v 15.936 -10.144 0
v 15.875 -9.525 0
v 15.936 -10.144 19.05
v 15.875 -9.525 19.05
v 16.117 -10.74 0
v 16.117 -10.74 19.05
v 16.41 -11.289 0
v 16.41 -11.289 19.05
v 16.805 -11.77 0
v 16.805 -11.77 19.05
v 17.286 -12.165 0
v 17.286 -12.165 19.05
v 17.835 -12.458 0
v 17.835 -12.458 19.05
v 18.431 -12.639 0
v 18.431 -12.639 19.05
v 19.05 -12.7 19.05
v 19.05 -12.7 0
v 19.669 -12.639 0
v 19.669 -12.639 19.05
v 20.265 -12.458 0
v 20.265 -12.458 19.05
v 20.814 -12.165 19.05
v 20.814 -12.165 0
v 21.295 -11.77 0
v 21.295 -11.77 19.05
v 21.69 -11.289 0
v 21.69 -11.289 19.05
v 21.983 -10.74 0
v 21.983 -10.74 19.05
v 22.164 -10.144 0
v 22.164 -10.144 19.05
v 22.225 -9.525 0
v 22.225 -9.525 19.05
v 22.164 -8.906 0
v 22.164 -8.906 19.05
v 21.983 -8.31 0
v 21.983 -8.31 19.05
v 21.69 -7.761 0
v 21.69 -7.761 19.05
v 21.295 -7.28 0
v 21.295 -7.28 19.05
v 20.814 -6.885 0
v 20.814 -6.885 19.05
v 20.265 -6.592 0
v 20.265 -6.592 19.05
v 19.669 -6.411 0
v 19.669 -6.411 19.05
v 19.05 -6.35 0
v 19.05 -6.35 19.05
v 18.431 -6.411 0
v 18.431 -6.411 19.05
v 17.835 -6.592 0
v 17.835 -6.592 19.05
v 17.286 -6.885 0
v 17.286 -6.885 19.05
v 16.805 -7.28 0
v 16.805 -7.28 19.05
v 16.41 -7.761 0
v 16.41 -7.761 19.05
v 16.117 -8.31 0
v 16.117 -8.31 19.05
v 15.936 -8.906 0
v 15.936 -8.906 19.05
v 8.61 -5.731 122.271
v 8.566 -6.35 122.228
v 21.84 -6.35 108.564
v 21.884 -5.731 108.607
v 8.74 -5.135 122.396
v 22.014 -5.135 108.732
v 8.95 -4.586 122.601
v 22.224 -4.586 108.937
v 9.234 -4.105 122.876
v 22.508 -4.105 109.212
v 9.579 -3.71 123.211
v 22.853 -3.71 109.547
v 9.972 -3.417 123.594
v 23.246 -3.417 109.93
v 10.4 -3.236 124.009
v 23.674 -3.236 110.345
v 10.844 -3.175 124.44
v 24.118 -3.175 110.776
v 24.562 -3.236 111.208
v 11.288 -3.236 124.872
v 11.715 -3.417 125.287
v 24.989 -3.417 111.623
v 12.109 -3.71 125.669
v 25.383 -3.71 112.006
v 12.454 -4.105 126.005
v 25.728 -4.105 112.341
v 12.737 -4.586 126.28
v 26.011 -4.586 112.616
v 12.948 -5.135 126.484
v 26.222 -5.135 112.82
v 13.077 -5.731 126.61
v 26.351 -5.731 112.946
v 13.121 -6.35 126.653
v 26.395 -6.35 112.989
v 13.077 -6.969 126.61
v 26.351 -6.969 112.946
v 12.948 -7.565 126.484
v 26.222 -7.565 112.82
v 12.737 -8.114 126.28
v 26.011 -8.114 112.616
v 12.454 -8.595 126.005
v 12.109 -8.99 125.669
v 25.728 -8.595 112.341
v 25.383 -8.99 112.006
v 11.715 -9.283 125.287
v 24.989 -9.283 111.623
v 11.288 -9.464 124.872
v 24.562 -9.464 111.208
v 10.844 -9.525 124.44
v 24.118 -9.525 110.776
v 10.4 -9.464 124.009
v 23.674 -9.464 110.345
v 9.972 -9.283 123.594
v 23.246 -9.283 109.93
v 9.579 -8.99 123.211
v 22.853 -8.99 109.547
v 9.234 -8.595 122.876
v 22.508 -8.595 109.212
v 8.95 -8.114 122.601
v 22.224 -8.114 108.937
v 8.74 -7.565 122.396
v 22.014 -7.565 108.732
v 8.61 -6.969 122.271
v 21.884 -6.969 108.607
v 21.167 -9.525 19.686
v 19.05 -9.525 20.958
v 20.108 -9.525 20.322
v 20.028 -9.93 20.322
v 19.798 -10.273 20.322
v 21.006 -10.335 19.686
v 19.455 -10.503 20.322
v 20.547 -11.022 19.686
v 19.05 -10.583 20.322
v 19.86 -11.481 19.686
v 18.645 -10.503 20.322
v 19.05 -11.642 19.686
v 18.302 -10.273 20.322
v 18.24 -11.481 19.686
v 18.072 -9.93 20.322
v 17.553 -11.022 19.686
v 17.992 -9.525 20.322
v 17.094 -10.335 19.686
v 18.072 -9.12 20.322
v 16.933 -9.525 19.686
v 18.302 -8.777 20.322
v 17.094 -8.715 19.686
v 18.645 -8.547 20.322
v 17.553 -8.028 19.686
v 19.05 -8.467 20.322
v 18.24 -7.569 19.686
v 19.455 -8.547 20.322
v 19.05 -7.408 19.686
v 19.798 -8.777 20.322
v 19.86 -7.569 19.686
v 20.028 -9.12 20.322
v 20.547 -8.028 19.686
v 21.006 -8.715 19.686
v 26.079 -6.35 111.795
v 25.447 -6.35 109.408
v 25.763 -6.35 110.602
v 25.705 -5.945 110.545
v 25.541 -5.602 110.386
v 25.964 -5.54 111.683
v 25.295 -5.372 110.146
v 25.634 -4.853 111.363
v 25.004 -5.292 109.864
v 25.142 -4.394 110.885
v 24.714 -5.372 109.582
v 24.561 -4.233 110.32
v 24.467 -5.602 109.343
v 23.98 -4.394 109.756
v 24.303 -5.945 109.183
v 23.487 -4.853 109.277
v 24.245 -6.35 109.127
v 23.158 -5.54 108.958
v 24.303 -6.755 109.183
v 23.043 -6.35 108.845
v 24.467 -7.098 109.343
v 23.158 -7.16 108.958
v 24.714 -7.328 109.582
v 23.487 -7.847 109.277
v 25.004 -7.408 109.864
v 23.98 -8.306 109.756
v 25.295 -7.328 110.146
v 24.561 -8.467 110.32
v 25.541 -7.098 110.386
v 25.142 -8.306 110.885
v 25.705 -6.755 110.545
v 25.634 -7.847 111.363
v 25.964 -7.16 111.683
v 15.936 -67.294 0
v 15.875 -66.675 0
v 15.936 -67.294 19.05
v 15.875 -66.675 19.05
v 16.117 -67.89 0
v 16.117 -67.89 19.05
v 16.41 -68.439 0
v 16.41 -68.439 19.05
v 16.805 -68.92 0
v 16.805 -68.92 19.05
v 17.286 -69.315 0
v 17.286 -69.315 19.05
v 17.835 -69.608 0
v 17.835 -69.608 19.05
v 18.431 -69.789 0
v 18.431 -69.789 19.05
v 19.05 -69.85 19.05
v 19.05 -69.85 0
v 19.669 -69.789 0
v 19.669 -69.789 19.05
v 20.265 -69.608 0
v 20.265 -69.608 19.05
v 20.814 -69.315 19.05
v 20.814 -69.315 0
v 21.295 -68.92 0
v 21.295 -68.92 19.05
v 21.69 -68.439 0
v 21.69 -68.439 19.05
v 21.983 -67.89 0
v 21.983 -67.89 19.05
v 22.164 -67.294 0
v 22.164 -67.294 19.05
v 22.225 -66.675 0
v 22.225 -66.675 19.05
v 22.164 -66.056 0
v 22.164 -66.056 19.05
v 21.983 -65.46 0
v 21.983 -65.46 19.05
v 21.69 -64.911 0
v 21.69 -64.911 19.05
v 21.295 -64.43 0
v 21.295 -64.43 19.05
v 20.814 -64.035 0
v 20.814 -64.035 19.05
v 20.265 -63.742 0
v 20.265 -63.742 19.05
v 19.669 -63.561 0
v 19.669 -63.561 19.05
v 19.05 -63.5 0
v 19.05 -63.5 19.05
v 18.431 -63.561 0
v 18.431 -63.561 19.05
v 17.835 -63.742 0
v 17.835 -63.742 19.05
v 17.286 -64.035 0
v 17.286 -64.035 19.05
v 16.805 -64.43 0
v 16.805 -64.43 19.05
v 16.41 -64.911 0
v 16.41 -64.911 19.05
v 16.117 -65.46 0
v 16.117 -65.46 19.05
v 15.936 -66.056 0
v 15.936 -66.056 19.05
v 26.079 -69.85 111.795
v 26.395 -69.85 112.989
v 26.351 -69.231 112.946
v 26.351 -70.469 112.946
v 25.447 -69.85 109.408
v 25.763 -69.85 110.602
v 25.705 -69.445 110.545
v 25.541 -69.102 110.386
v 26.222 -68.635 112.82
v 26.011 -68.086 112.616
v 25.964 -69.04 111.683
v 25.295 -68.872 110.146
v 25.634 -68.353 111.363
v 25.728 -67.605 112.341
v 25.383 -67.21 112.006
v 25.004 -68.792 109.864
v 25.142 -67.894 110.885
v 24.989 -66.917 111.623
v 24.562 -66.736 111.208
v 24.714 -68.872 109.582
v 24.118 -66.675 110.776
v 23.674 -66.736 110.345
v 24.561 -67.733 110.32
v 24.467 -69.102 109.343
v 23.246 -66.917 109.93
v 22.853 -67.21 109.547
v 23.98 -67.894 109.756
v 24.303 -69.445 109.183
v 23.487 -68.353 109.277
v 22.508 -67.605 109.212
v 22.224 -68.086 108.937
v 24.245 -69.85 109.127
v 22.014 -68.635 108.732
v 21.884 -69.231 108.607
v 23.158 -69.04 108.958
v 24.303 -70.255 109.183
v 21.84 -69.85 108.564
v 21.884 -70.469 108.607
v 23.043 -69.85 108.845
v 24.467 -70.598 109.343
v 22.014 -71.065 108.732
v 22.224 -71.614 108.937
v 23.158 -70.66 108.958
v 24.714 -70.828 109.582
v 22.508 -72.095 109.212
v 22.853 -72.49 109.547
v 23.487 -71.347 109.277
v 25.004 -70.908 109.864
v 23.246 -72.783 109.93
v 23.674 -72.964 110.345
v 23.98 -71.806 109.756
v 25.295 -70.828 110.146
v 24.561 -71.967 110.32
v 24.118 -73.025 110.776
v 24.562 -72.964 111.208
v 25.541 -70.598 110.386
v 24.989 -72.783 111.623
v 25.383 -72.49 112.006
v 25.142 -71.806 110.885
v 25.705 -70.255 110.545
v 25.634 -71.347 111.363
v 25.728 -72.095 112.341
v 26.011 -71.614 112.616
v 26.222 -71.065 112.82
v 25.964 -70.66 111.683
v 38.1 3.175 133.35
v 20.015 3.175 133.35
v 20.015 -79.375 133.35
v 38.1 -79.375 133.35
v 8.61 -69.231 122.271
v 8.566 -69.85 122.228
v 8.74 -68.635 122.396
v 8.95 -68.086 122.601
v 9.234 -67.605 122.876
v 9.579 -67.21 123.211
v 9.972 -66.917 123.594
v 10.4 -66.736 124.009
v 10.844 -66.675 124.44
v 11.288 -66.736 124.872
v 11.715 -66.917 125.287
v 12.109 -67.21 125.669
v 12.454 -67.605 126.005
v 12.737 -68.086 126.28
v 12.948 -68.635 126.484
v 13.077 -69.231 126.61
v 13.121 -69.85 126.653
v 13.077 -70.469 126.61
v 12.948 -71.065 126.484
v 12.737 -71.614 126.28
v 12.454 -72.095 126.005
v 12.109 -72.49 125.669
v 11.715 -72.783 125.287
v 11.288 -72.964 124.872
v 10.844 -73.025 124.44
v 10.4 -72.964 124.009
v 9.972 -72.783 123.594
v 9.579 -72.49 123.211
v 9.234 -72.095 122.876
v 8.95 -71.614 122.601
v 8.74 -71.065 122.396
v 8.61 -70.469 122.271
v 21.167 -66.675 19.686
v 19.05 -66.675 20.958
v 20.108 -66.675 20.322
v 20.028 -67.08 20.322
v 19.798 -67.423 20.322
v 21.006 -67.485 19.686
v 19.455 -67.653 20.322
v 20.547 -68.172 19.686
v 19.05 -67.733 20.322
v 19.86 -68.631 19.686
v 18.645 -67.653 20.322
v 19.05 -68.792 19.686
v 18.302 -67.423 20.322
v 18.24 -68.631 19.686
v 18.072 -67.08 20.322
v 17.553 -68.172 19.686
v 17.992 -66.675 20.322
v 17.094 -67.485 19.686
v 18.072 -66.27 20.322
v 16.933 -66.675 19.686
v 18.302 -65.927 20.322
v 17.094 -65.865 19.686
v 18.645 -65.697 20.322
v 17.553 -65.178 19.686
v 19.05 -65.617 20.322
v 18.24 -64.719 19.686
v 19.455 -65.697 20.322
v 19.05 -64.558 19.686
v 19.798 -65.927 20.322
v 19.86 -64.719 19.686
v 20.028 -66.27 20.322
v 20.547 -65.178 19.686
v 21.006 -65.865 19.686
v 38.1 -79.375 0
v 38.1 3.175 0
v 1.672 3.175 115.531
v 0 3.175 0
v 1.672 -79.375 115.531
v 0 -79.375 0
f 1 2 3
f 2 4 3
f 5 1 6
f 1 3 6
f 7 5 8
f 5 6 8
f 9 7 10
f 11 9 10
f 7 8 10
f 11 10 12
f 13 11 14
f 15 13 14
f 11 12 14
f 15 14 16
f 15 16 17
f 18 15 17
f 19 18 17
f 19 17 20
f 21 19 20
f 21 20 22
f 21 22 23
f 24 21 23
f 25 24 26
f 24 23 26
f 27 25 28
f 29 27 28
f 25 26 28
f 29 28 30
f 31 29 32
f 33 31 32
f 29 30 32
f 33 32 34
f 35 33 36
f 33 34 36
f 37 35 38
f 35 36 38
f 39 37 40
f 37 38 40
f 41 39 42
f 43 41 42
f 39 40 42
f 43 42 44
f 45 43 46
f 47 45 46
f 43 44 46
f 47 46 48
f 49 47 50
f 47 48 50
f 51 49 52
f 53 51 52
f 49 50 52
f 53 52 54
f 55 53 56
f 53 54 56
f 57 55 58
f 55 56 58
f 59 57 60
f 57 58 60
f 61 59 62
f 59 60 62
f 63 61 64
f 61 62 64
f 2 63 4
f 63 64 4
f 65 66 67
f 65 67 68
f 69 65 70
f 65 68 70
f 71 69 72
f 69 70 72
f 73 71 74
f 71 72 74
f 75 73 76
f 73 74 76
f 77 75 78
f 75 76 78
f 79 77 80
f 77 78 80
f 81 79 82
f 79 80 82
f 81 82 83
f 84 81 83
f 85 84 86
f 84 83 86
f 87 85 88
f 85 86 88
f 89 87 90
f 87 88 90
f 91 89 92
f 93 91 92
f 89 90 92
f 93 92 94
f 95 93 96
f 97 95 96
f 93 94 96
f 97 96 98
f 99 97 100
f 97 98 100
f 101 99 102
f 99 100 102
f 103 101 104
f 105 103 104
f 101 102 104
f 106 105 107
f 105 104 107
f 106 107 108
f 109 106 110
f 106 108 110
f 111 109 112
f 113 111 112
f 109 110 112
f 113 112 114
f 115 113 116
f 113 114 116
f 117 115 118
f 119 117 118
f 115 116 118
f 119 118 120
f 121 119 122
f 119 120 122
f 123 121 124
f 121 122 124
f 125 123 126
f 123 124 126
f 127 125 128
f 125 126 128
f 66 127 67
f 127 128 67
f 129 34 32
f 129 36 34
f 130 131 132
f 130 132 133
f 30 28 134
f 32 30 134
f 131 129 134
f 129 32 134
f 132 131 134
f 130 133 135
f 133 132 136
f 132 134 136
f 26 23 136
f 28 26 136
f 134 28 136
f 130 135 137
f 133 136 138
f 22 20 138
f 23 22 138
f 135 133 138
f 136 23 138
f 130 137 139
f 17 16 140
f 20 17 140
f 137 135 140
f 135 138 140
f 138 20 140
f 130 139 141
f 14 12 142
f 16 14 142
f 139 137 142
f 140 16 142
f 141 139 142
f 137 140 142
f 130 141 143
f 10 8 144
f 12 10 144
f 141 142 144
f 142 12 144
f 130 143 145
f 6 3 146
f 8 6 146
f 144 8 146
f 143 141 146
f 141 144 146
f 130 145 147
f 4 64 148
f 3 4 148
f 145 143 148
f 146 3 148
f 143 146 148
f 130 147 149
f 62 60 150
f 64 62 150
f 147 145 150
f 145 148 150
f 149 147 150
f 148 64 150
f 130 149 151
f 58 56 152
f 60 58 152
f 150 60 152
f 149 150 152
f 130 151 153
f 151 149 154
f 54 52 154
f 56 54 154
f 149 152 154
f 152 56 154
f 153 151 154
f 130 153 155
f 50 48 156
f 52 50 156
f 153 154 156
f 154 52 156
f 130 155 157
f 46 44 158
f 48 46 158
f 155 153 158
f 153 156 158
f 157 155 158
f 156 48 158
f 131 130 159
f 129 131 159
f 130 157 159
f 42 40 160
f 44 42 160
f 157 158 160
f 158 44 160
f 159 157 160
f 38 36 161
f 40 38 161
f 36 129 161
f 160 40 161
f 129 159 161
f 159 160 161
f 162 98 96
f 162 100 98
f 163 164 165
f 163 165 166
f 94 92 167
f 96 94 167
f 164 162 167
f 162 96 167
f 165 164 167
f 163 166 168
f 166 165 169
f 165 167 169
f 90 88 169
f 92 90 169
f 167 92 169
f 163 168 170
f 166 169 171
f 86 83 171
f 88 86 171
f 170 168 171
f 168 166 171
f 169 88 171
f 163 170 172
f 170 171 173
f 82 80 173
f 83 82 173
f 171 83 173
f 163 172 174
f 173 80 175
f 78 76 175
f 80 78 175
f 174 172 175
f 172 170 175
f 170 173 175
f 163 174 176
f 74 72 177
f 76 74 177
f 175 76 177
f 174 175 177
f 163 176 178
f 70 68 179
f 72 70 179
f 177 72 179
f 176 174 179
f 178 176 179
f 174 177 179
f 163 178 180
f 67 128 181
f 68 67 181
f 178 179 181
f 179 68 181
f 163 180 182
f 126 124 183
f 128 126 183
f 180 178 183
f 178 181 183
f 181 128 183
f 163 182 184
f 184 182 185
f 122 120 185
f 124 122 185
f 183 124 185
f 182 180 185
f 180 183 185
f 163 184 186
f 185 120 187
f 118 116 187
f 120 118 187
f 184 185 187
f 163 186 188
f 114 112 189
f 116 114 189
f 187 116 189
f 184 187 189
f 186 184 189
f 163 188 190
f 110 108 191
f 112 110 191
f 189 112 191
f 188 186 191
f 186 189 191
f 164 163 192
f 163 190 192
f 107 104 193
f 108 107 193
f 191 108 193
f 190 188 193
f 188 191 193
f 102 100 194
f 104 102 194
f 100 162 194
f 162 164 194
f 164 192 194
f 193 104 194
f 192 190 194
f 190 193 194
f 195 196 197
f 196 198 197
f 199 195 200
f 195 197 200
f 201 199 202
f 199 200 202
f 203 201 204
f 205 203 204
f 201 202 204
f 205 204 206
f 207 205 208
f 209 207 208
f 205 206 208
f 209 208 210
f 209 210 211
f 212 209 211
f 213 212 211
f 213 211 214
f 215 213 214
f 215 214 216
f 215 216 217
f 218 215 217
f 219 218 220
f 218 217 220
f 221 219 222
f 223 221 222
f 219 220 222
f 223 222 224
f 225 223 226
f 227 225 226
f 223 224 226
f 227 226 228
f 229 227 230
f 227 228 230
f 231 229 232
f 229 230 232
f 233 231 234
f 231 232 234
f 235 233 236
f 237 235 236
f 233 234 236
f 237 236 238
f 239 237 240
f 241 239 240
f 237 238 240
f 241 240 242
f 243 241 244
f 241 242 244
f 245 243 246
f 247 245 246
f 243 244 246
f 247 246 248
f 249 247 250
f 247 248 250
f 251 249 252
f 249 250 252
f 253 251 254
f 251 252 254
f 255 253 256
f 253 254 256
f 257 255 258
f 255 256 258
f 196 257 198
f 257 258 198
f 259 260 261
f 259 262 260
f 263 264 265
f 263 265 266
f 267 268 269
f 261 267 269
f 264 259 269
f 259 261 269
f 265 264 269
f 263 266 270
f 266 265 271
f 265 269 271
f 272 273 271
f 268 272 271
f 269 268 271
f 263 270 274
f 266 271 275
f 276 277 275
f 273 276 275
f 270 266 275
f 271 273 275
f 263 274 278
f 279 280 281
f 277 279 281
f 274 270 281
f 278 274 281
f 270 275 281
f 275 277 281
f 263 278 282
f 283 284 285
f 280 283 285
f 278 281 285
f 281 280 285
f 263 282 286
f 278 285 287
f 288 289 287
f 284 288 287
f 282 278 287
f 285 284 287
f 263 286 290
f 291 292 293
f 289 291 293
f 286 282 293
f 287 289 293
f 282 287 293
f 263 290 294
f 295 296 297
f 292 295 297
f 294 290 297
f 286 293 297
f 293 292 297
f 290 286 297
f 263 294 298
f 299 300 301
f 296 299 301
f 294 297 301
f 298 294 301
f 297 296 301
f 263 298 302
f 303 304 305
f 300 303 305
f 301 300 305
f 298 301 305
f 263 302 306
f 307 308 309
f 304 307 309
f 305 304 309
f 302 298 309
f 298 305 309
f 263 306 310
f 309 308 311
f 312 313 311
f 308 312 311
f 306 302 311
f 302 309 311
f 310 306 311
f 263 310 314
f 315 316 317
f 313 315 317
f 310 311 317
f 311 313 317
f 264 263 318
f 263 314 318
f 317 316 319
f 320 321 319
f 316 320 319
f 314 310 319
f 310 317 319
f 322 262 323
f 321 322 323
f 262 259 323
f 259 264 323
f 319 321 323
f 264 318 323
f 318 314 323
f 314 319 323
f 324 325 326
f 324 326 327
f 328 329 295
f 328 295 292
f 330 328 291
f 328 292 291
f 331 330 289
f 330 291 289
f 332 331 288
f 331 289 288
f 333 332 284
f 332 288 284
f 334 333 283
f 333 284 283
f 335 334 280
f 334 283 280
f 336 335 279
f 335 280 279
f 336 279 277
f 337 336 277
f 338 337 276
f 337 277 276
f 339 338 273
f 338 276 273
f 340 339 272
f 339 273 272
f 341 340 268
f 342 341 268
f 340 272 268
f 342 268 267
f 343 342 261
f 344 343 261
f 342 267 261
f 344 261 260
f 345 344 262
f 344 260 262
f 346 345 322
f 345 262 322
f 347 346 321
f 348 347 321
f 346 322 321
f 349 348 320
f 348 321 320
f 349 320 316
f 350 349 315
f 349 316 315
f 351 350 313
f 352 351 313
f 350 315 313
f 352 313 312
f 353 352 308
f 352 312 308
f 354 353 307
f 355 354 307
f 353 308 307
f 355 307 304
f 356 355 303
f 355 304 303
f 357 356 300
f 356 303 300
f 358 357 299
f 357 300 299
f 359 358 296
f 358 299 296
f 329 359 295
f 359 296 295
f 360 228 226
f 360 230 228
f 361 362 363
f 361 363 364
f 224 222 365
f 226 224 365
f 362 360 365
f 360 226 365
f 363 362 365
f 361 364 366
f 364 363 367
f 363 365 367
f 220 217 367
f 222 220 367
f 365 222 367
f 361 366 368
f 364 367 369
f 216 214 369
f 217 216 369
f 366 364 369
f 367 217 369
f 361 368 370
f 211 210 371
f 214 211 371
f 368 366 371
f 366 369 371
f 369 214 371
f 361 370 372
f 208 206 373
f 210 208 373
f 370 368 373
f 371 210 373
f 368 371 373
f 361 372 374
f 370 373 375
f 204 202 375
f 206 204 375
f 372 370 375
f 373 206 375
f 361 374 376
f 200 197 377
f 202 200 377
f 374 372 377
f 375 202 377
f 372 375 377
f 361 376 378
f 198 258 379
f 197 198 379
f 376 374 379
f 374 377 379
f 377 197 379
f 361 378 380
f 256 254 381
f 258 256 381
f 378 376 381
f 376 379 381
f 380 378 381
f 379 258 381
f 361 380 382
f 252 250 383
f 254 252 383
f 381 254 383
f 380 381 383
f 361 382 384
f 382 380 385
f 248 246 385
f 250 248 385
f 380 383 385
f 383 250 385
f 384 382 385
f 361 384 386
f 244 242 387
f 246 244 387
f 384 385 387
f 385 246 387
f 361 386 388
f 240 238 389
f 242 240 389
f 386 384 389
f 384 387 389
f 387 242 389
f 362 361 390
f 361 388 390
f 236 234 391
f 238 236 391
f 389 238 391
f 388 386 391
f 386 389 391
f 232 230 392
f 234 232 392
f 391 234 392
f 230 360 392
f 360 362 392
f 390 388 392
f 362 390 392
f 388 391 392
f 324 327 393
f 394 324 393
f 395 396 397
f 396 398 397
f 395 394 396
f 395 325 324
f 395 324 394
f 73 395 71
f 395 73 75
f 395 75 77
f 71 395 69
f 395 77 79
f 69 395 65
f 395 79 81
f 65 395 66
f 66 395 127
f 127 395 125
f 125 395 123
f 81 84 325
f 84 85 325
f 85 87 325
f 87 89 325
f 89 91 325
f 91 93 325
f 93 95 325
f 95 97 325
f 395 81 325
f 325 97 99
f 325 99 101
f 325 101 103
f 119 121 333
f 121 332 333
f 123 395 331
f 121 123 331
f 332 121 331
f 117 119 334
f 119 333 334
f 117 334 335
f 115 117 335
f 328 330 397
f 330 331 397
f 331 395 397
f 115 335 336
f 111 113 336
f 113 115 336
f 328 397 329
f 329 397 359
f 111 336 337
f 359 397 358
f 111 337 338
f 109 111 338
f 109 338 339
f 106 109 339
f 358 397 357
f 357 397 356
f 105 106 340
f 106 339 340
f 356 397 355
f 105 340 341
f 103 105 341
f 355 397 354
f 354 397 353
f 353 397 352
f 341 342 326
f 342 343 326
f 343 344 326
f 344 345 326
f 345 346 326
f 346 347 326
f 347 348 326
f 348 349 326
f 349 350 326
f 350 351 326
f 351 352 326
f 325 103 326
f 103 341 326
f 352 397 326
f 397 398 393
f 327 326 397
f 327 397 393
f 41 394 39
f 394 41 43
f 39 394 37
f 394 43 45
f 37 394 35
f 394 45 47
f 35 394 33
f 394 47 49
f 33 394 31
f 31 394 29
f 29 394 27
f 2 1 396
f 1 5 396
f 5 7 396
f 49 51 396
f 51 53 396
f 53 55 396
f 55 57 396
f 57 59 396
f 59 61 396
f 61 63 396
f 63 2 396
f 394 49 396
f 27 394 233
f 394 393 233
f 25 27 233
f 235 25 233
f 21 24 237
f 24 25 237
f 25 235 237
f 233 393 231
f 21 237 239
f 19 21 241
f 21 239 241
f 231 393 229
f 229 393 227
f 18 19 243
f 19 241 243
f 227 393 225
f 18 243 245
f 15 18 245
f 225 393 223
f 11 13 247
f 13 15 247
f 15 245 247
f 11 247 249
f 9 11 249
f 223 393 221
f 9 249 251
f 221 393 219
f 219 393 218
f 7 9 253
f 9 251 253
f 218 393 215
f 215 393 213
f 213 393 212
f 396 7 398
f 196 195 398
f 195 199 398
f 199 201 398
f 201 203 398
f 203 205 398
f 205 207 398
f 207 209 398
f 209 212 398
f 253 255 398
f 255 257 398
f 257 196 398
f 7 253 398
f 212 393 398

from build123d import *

# Parameters (mm, degrees)
F1_DEPTH = 76.2
F3_D     = 6.35
F3_DEPTH = 19.05
F3_TIP   = 1.9077324654
F5_DEPTH = 3.175
F7_DEPTH = 3.175
F9_D     = 6.35
F9_DEPTH = 19.05
F9_TIP   = 1.9077324654


with BuildPart() as f1:
    # F0 (on Front) → F1 (new body)
    with BuildSketch(Plane.XZ):
        Polygon((1.6724448999, 115.5307332167), (0, 0), (38.1, 0), (38.1, 133.35), (20.0152, 133.35), align=None)
    extrude(amount=F1_DEPTH)

    # F3
    with Locations(Plane(origin=(-56.9291441584, 0, 58.6015890583), x_dir=(0.7172678422, 0, 0.6967975621), z_dir=(-0.6967975621, 0, 0.7172678422))):
        with Locations((94.487669207, -6.35), (94.487669207, -69.85)):
            Hole(F3_D / 2, depth=F3_DEPTH)
            with Locations((0, 0, -(F3_DEPTH + F3_TIP / 2))):  # 118° drill point
                Cone(0, F3_D / 2, F3_TIP, mode=Mode.SUBTRACT)

    # F4 (on face) → F5 (join)
    with BuildSketch(Plane.XZ.offset(76.2)):
        Polygon((20.0152, 133.35), (1.6724448999, 115.5307332167), (0, 0), (38.1, 0), (38.1, 133.35), align=None)
    extrude(amount=F5_DEPTH)

    # F6 (on face) → F7 (join)
    with BuildSketch(Plane(origin=(0, 0, 0), x_dir=(-1, 0, 0), z_dir=(0, 1, 0))):
        Polygon((-38.1, 0), (0, 0), (-1.6724448999, 115.5307332167), (-20.0152, 133.35), (-38.1, 133.35), align=None)
    extrude(amount=F7_DEPTH)

    # F9
    with Locations(Plane(origin=(0, 0, 0), x_dir=(1, 0, 0), z_dir=(0, 0, -1))):
        with Locations((19.05, 9.525), (19.05, 66.675)):
            Hole(F9_D / 2, depth=F9_DEPTH)
            with Locations((0, 0, -(F9_DEPTH + F9_TIP / 2))):  # 118° drill point
                Cone(0, F9_D / 2, F9_TIP, mode=Mode.SUBTRACT)


solid = f1.part
